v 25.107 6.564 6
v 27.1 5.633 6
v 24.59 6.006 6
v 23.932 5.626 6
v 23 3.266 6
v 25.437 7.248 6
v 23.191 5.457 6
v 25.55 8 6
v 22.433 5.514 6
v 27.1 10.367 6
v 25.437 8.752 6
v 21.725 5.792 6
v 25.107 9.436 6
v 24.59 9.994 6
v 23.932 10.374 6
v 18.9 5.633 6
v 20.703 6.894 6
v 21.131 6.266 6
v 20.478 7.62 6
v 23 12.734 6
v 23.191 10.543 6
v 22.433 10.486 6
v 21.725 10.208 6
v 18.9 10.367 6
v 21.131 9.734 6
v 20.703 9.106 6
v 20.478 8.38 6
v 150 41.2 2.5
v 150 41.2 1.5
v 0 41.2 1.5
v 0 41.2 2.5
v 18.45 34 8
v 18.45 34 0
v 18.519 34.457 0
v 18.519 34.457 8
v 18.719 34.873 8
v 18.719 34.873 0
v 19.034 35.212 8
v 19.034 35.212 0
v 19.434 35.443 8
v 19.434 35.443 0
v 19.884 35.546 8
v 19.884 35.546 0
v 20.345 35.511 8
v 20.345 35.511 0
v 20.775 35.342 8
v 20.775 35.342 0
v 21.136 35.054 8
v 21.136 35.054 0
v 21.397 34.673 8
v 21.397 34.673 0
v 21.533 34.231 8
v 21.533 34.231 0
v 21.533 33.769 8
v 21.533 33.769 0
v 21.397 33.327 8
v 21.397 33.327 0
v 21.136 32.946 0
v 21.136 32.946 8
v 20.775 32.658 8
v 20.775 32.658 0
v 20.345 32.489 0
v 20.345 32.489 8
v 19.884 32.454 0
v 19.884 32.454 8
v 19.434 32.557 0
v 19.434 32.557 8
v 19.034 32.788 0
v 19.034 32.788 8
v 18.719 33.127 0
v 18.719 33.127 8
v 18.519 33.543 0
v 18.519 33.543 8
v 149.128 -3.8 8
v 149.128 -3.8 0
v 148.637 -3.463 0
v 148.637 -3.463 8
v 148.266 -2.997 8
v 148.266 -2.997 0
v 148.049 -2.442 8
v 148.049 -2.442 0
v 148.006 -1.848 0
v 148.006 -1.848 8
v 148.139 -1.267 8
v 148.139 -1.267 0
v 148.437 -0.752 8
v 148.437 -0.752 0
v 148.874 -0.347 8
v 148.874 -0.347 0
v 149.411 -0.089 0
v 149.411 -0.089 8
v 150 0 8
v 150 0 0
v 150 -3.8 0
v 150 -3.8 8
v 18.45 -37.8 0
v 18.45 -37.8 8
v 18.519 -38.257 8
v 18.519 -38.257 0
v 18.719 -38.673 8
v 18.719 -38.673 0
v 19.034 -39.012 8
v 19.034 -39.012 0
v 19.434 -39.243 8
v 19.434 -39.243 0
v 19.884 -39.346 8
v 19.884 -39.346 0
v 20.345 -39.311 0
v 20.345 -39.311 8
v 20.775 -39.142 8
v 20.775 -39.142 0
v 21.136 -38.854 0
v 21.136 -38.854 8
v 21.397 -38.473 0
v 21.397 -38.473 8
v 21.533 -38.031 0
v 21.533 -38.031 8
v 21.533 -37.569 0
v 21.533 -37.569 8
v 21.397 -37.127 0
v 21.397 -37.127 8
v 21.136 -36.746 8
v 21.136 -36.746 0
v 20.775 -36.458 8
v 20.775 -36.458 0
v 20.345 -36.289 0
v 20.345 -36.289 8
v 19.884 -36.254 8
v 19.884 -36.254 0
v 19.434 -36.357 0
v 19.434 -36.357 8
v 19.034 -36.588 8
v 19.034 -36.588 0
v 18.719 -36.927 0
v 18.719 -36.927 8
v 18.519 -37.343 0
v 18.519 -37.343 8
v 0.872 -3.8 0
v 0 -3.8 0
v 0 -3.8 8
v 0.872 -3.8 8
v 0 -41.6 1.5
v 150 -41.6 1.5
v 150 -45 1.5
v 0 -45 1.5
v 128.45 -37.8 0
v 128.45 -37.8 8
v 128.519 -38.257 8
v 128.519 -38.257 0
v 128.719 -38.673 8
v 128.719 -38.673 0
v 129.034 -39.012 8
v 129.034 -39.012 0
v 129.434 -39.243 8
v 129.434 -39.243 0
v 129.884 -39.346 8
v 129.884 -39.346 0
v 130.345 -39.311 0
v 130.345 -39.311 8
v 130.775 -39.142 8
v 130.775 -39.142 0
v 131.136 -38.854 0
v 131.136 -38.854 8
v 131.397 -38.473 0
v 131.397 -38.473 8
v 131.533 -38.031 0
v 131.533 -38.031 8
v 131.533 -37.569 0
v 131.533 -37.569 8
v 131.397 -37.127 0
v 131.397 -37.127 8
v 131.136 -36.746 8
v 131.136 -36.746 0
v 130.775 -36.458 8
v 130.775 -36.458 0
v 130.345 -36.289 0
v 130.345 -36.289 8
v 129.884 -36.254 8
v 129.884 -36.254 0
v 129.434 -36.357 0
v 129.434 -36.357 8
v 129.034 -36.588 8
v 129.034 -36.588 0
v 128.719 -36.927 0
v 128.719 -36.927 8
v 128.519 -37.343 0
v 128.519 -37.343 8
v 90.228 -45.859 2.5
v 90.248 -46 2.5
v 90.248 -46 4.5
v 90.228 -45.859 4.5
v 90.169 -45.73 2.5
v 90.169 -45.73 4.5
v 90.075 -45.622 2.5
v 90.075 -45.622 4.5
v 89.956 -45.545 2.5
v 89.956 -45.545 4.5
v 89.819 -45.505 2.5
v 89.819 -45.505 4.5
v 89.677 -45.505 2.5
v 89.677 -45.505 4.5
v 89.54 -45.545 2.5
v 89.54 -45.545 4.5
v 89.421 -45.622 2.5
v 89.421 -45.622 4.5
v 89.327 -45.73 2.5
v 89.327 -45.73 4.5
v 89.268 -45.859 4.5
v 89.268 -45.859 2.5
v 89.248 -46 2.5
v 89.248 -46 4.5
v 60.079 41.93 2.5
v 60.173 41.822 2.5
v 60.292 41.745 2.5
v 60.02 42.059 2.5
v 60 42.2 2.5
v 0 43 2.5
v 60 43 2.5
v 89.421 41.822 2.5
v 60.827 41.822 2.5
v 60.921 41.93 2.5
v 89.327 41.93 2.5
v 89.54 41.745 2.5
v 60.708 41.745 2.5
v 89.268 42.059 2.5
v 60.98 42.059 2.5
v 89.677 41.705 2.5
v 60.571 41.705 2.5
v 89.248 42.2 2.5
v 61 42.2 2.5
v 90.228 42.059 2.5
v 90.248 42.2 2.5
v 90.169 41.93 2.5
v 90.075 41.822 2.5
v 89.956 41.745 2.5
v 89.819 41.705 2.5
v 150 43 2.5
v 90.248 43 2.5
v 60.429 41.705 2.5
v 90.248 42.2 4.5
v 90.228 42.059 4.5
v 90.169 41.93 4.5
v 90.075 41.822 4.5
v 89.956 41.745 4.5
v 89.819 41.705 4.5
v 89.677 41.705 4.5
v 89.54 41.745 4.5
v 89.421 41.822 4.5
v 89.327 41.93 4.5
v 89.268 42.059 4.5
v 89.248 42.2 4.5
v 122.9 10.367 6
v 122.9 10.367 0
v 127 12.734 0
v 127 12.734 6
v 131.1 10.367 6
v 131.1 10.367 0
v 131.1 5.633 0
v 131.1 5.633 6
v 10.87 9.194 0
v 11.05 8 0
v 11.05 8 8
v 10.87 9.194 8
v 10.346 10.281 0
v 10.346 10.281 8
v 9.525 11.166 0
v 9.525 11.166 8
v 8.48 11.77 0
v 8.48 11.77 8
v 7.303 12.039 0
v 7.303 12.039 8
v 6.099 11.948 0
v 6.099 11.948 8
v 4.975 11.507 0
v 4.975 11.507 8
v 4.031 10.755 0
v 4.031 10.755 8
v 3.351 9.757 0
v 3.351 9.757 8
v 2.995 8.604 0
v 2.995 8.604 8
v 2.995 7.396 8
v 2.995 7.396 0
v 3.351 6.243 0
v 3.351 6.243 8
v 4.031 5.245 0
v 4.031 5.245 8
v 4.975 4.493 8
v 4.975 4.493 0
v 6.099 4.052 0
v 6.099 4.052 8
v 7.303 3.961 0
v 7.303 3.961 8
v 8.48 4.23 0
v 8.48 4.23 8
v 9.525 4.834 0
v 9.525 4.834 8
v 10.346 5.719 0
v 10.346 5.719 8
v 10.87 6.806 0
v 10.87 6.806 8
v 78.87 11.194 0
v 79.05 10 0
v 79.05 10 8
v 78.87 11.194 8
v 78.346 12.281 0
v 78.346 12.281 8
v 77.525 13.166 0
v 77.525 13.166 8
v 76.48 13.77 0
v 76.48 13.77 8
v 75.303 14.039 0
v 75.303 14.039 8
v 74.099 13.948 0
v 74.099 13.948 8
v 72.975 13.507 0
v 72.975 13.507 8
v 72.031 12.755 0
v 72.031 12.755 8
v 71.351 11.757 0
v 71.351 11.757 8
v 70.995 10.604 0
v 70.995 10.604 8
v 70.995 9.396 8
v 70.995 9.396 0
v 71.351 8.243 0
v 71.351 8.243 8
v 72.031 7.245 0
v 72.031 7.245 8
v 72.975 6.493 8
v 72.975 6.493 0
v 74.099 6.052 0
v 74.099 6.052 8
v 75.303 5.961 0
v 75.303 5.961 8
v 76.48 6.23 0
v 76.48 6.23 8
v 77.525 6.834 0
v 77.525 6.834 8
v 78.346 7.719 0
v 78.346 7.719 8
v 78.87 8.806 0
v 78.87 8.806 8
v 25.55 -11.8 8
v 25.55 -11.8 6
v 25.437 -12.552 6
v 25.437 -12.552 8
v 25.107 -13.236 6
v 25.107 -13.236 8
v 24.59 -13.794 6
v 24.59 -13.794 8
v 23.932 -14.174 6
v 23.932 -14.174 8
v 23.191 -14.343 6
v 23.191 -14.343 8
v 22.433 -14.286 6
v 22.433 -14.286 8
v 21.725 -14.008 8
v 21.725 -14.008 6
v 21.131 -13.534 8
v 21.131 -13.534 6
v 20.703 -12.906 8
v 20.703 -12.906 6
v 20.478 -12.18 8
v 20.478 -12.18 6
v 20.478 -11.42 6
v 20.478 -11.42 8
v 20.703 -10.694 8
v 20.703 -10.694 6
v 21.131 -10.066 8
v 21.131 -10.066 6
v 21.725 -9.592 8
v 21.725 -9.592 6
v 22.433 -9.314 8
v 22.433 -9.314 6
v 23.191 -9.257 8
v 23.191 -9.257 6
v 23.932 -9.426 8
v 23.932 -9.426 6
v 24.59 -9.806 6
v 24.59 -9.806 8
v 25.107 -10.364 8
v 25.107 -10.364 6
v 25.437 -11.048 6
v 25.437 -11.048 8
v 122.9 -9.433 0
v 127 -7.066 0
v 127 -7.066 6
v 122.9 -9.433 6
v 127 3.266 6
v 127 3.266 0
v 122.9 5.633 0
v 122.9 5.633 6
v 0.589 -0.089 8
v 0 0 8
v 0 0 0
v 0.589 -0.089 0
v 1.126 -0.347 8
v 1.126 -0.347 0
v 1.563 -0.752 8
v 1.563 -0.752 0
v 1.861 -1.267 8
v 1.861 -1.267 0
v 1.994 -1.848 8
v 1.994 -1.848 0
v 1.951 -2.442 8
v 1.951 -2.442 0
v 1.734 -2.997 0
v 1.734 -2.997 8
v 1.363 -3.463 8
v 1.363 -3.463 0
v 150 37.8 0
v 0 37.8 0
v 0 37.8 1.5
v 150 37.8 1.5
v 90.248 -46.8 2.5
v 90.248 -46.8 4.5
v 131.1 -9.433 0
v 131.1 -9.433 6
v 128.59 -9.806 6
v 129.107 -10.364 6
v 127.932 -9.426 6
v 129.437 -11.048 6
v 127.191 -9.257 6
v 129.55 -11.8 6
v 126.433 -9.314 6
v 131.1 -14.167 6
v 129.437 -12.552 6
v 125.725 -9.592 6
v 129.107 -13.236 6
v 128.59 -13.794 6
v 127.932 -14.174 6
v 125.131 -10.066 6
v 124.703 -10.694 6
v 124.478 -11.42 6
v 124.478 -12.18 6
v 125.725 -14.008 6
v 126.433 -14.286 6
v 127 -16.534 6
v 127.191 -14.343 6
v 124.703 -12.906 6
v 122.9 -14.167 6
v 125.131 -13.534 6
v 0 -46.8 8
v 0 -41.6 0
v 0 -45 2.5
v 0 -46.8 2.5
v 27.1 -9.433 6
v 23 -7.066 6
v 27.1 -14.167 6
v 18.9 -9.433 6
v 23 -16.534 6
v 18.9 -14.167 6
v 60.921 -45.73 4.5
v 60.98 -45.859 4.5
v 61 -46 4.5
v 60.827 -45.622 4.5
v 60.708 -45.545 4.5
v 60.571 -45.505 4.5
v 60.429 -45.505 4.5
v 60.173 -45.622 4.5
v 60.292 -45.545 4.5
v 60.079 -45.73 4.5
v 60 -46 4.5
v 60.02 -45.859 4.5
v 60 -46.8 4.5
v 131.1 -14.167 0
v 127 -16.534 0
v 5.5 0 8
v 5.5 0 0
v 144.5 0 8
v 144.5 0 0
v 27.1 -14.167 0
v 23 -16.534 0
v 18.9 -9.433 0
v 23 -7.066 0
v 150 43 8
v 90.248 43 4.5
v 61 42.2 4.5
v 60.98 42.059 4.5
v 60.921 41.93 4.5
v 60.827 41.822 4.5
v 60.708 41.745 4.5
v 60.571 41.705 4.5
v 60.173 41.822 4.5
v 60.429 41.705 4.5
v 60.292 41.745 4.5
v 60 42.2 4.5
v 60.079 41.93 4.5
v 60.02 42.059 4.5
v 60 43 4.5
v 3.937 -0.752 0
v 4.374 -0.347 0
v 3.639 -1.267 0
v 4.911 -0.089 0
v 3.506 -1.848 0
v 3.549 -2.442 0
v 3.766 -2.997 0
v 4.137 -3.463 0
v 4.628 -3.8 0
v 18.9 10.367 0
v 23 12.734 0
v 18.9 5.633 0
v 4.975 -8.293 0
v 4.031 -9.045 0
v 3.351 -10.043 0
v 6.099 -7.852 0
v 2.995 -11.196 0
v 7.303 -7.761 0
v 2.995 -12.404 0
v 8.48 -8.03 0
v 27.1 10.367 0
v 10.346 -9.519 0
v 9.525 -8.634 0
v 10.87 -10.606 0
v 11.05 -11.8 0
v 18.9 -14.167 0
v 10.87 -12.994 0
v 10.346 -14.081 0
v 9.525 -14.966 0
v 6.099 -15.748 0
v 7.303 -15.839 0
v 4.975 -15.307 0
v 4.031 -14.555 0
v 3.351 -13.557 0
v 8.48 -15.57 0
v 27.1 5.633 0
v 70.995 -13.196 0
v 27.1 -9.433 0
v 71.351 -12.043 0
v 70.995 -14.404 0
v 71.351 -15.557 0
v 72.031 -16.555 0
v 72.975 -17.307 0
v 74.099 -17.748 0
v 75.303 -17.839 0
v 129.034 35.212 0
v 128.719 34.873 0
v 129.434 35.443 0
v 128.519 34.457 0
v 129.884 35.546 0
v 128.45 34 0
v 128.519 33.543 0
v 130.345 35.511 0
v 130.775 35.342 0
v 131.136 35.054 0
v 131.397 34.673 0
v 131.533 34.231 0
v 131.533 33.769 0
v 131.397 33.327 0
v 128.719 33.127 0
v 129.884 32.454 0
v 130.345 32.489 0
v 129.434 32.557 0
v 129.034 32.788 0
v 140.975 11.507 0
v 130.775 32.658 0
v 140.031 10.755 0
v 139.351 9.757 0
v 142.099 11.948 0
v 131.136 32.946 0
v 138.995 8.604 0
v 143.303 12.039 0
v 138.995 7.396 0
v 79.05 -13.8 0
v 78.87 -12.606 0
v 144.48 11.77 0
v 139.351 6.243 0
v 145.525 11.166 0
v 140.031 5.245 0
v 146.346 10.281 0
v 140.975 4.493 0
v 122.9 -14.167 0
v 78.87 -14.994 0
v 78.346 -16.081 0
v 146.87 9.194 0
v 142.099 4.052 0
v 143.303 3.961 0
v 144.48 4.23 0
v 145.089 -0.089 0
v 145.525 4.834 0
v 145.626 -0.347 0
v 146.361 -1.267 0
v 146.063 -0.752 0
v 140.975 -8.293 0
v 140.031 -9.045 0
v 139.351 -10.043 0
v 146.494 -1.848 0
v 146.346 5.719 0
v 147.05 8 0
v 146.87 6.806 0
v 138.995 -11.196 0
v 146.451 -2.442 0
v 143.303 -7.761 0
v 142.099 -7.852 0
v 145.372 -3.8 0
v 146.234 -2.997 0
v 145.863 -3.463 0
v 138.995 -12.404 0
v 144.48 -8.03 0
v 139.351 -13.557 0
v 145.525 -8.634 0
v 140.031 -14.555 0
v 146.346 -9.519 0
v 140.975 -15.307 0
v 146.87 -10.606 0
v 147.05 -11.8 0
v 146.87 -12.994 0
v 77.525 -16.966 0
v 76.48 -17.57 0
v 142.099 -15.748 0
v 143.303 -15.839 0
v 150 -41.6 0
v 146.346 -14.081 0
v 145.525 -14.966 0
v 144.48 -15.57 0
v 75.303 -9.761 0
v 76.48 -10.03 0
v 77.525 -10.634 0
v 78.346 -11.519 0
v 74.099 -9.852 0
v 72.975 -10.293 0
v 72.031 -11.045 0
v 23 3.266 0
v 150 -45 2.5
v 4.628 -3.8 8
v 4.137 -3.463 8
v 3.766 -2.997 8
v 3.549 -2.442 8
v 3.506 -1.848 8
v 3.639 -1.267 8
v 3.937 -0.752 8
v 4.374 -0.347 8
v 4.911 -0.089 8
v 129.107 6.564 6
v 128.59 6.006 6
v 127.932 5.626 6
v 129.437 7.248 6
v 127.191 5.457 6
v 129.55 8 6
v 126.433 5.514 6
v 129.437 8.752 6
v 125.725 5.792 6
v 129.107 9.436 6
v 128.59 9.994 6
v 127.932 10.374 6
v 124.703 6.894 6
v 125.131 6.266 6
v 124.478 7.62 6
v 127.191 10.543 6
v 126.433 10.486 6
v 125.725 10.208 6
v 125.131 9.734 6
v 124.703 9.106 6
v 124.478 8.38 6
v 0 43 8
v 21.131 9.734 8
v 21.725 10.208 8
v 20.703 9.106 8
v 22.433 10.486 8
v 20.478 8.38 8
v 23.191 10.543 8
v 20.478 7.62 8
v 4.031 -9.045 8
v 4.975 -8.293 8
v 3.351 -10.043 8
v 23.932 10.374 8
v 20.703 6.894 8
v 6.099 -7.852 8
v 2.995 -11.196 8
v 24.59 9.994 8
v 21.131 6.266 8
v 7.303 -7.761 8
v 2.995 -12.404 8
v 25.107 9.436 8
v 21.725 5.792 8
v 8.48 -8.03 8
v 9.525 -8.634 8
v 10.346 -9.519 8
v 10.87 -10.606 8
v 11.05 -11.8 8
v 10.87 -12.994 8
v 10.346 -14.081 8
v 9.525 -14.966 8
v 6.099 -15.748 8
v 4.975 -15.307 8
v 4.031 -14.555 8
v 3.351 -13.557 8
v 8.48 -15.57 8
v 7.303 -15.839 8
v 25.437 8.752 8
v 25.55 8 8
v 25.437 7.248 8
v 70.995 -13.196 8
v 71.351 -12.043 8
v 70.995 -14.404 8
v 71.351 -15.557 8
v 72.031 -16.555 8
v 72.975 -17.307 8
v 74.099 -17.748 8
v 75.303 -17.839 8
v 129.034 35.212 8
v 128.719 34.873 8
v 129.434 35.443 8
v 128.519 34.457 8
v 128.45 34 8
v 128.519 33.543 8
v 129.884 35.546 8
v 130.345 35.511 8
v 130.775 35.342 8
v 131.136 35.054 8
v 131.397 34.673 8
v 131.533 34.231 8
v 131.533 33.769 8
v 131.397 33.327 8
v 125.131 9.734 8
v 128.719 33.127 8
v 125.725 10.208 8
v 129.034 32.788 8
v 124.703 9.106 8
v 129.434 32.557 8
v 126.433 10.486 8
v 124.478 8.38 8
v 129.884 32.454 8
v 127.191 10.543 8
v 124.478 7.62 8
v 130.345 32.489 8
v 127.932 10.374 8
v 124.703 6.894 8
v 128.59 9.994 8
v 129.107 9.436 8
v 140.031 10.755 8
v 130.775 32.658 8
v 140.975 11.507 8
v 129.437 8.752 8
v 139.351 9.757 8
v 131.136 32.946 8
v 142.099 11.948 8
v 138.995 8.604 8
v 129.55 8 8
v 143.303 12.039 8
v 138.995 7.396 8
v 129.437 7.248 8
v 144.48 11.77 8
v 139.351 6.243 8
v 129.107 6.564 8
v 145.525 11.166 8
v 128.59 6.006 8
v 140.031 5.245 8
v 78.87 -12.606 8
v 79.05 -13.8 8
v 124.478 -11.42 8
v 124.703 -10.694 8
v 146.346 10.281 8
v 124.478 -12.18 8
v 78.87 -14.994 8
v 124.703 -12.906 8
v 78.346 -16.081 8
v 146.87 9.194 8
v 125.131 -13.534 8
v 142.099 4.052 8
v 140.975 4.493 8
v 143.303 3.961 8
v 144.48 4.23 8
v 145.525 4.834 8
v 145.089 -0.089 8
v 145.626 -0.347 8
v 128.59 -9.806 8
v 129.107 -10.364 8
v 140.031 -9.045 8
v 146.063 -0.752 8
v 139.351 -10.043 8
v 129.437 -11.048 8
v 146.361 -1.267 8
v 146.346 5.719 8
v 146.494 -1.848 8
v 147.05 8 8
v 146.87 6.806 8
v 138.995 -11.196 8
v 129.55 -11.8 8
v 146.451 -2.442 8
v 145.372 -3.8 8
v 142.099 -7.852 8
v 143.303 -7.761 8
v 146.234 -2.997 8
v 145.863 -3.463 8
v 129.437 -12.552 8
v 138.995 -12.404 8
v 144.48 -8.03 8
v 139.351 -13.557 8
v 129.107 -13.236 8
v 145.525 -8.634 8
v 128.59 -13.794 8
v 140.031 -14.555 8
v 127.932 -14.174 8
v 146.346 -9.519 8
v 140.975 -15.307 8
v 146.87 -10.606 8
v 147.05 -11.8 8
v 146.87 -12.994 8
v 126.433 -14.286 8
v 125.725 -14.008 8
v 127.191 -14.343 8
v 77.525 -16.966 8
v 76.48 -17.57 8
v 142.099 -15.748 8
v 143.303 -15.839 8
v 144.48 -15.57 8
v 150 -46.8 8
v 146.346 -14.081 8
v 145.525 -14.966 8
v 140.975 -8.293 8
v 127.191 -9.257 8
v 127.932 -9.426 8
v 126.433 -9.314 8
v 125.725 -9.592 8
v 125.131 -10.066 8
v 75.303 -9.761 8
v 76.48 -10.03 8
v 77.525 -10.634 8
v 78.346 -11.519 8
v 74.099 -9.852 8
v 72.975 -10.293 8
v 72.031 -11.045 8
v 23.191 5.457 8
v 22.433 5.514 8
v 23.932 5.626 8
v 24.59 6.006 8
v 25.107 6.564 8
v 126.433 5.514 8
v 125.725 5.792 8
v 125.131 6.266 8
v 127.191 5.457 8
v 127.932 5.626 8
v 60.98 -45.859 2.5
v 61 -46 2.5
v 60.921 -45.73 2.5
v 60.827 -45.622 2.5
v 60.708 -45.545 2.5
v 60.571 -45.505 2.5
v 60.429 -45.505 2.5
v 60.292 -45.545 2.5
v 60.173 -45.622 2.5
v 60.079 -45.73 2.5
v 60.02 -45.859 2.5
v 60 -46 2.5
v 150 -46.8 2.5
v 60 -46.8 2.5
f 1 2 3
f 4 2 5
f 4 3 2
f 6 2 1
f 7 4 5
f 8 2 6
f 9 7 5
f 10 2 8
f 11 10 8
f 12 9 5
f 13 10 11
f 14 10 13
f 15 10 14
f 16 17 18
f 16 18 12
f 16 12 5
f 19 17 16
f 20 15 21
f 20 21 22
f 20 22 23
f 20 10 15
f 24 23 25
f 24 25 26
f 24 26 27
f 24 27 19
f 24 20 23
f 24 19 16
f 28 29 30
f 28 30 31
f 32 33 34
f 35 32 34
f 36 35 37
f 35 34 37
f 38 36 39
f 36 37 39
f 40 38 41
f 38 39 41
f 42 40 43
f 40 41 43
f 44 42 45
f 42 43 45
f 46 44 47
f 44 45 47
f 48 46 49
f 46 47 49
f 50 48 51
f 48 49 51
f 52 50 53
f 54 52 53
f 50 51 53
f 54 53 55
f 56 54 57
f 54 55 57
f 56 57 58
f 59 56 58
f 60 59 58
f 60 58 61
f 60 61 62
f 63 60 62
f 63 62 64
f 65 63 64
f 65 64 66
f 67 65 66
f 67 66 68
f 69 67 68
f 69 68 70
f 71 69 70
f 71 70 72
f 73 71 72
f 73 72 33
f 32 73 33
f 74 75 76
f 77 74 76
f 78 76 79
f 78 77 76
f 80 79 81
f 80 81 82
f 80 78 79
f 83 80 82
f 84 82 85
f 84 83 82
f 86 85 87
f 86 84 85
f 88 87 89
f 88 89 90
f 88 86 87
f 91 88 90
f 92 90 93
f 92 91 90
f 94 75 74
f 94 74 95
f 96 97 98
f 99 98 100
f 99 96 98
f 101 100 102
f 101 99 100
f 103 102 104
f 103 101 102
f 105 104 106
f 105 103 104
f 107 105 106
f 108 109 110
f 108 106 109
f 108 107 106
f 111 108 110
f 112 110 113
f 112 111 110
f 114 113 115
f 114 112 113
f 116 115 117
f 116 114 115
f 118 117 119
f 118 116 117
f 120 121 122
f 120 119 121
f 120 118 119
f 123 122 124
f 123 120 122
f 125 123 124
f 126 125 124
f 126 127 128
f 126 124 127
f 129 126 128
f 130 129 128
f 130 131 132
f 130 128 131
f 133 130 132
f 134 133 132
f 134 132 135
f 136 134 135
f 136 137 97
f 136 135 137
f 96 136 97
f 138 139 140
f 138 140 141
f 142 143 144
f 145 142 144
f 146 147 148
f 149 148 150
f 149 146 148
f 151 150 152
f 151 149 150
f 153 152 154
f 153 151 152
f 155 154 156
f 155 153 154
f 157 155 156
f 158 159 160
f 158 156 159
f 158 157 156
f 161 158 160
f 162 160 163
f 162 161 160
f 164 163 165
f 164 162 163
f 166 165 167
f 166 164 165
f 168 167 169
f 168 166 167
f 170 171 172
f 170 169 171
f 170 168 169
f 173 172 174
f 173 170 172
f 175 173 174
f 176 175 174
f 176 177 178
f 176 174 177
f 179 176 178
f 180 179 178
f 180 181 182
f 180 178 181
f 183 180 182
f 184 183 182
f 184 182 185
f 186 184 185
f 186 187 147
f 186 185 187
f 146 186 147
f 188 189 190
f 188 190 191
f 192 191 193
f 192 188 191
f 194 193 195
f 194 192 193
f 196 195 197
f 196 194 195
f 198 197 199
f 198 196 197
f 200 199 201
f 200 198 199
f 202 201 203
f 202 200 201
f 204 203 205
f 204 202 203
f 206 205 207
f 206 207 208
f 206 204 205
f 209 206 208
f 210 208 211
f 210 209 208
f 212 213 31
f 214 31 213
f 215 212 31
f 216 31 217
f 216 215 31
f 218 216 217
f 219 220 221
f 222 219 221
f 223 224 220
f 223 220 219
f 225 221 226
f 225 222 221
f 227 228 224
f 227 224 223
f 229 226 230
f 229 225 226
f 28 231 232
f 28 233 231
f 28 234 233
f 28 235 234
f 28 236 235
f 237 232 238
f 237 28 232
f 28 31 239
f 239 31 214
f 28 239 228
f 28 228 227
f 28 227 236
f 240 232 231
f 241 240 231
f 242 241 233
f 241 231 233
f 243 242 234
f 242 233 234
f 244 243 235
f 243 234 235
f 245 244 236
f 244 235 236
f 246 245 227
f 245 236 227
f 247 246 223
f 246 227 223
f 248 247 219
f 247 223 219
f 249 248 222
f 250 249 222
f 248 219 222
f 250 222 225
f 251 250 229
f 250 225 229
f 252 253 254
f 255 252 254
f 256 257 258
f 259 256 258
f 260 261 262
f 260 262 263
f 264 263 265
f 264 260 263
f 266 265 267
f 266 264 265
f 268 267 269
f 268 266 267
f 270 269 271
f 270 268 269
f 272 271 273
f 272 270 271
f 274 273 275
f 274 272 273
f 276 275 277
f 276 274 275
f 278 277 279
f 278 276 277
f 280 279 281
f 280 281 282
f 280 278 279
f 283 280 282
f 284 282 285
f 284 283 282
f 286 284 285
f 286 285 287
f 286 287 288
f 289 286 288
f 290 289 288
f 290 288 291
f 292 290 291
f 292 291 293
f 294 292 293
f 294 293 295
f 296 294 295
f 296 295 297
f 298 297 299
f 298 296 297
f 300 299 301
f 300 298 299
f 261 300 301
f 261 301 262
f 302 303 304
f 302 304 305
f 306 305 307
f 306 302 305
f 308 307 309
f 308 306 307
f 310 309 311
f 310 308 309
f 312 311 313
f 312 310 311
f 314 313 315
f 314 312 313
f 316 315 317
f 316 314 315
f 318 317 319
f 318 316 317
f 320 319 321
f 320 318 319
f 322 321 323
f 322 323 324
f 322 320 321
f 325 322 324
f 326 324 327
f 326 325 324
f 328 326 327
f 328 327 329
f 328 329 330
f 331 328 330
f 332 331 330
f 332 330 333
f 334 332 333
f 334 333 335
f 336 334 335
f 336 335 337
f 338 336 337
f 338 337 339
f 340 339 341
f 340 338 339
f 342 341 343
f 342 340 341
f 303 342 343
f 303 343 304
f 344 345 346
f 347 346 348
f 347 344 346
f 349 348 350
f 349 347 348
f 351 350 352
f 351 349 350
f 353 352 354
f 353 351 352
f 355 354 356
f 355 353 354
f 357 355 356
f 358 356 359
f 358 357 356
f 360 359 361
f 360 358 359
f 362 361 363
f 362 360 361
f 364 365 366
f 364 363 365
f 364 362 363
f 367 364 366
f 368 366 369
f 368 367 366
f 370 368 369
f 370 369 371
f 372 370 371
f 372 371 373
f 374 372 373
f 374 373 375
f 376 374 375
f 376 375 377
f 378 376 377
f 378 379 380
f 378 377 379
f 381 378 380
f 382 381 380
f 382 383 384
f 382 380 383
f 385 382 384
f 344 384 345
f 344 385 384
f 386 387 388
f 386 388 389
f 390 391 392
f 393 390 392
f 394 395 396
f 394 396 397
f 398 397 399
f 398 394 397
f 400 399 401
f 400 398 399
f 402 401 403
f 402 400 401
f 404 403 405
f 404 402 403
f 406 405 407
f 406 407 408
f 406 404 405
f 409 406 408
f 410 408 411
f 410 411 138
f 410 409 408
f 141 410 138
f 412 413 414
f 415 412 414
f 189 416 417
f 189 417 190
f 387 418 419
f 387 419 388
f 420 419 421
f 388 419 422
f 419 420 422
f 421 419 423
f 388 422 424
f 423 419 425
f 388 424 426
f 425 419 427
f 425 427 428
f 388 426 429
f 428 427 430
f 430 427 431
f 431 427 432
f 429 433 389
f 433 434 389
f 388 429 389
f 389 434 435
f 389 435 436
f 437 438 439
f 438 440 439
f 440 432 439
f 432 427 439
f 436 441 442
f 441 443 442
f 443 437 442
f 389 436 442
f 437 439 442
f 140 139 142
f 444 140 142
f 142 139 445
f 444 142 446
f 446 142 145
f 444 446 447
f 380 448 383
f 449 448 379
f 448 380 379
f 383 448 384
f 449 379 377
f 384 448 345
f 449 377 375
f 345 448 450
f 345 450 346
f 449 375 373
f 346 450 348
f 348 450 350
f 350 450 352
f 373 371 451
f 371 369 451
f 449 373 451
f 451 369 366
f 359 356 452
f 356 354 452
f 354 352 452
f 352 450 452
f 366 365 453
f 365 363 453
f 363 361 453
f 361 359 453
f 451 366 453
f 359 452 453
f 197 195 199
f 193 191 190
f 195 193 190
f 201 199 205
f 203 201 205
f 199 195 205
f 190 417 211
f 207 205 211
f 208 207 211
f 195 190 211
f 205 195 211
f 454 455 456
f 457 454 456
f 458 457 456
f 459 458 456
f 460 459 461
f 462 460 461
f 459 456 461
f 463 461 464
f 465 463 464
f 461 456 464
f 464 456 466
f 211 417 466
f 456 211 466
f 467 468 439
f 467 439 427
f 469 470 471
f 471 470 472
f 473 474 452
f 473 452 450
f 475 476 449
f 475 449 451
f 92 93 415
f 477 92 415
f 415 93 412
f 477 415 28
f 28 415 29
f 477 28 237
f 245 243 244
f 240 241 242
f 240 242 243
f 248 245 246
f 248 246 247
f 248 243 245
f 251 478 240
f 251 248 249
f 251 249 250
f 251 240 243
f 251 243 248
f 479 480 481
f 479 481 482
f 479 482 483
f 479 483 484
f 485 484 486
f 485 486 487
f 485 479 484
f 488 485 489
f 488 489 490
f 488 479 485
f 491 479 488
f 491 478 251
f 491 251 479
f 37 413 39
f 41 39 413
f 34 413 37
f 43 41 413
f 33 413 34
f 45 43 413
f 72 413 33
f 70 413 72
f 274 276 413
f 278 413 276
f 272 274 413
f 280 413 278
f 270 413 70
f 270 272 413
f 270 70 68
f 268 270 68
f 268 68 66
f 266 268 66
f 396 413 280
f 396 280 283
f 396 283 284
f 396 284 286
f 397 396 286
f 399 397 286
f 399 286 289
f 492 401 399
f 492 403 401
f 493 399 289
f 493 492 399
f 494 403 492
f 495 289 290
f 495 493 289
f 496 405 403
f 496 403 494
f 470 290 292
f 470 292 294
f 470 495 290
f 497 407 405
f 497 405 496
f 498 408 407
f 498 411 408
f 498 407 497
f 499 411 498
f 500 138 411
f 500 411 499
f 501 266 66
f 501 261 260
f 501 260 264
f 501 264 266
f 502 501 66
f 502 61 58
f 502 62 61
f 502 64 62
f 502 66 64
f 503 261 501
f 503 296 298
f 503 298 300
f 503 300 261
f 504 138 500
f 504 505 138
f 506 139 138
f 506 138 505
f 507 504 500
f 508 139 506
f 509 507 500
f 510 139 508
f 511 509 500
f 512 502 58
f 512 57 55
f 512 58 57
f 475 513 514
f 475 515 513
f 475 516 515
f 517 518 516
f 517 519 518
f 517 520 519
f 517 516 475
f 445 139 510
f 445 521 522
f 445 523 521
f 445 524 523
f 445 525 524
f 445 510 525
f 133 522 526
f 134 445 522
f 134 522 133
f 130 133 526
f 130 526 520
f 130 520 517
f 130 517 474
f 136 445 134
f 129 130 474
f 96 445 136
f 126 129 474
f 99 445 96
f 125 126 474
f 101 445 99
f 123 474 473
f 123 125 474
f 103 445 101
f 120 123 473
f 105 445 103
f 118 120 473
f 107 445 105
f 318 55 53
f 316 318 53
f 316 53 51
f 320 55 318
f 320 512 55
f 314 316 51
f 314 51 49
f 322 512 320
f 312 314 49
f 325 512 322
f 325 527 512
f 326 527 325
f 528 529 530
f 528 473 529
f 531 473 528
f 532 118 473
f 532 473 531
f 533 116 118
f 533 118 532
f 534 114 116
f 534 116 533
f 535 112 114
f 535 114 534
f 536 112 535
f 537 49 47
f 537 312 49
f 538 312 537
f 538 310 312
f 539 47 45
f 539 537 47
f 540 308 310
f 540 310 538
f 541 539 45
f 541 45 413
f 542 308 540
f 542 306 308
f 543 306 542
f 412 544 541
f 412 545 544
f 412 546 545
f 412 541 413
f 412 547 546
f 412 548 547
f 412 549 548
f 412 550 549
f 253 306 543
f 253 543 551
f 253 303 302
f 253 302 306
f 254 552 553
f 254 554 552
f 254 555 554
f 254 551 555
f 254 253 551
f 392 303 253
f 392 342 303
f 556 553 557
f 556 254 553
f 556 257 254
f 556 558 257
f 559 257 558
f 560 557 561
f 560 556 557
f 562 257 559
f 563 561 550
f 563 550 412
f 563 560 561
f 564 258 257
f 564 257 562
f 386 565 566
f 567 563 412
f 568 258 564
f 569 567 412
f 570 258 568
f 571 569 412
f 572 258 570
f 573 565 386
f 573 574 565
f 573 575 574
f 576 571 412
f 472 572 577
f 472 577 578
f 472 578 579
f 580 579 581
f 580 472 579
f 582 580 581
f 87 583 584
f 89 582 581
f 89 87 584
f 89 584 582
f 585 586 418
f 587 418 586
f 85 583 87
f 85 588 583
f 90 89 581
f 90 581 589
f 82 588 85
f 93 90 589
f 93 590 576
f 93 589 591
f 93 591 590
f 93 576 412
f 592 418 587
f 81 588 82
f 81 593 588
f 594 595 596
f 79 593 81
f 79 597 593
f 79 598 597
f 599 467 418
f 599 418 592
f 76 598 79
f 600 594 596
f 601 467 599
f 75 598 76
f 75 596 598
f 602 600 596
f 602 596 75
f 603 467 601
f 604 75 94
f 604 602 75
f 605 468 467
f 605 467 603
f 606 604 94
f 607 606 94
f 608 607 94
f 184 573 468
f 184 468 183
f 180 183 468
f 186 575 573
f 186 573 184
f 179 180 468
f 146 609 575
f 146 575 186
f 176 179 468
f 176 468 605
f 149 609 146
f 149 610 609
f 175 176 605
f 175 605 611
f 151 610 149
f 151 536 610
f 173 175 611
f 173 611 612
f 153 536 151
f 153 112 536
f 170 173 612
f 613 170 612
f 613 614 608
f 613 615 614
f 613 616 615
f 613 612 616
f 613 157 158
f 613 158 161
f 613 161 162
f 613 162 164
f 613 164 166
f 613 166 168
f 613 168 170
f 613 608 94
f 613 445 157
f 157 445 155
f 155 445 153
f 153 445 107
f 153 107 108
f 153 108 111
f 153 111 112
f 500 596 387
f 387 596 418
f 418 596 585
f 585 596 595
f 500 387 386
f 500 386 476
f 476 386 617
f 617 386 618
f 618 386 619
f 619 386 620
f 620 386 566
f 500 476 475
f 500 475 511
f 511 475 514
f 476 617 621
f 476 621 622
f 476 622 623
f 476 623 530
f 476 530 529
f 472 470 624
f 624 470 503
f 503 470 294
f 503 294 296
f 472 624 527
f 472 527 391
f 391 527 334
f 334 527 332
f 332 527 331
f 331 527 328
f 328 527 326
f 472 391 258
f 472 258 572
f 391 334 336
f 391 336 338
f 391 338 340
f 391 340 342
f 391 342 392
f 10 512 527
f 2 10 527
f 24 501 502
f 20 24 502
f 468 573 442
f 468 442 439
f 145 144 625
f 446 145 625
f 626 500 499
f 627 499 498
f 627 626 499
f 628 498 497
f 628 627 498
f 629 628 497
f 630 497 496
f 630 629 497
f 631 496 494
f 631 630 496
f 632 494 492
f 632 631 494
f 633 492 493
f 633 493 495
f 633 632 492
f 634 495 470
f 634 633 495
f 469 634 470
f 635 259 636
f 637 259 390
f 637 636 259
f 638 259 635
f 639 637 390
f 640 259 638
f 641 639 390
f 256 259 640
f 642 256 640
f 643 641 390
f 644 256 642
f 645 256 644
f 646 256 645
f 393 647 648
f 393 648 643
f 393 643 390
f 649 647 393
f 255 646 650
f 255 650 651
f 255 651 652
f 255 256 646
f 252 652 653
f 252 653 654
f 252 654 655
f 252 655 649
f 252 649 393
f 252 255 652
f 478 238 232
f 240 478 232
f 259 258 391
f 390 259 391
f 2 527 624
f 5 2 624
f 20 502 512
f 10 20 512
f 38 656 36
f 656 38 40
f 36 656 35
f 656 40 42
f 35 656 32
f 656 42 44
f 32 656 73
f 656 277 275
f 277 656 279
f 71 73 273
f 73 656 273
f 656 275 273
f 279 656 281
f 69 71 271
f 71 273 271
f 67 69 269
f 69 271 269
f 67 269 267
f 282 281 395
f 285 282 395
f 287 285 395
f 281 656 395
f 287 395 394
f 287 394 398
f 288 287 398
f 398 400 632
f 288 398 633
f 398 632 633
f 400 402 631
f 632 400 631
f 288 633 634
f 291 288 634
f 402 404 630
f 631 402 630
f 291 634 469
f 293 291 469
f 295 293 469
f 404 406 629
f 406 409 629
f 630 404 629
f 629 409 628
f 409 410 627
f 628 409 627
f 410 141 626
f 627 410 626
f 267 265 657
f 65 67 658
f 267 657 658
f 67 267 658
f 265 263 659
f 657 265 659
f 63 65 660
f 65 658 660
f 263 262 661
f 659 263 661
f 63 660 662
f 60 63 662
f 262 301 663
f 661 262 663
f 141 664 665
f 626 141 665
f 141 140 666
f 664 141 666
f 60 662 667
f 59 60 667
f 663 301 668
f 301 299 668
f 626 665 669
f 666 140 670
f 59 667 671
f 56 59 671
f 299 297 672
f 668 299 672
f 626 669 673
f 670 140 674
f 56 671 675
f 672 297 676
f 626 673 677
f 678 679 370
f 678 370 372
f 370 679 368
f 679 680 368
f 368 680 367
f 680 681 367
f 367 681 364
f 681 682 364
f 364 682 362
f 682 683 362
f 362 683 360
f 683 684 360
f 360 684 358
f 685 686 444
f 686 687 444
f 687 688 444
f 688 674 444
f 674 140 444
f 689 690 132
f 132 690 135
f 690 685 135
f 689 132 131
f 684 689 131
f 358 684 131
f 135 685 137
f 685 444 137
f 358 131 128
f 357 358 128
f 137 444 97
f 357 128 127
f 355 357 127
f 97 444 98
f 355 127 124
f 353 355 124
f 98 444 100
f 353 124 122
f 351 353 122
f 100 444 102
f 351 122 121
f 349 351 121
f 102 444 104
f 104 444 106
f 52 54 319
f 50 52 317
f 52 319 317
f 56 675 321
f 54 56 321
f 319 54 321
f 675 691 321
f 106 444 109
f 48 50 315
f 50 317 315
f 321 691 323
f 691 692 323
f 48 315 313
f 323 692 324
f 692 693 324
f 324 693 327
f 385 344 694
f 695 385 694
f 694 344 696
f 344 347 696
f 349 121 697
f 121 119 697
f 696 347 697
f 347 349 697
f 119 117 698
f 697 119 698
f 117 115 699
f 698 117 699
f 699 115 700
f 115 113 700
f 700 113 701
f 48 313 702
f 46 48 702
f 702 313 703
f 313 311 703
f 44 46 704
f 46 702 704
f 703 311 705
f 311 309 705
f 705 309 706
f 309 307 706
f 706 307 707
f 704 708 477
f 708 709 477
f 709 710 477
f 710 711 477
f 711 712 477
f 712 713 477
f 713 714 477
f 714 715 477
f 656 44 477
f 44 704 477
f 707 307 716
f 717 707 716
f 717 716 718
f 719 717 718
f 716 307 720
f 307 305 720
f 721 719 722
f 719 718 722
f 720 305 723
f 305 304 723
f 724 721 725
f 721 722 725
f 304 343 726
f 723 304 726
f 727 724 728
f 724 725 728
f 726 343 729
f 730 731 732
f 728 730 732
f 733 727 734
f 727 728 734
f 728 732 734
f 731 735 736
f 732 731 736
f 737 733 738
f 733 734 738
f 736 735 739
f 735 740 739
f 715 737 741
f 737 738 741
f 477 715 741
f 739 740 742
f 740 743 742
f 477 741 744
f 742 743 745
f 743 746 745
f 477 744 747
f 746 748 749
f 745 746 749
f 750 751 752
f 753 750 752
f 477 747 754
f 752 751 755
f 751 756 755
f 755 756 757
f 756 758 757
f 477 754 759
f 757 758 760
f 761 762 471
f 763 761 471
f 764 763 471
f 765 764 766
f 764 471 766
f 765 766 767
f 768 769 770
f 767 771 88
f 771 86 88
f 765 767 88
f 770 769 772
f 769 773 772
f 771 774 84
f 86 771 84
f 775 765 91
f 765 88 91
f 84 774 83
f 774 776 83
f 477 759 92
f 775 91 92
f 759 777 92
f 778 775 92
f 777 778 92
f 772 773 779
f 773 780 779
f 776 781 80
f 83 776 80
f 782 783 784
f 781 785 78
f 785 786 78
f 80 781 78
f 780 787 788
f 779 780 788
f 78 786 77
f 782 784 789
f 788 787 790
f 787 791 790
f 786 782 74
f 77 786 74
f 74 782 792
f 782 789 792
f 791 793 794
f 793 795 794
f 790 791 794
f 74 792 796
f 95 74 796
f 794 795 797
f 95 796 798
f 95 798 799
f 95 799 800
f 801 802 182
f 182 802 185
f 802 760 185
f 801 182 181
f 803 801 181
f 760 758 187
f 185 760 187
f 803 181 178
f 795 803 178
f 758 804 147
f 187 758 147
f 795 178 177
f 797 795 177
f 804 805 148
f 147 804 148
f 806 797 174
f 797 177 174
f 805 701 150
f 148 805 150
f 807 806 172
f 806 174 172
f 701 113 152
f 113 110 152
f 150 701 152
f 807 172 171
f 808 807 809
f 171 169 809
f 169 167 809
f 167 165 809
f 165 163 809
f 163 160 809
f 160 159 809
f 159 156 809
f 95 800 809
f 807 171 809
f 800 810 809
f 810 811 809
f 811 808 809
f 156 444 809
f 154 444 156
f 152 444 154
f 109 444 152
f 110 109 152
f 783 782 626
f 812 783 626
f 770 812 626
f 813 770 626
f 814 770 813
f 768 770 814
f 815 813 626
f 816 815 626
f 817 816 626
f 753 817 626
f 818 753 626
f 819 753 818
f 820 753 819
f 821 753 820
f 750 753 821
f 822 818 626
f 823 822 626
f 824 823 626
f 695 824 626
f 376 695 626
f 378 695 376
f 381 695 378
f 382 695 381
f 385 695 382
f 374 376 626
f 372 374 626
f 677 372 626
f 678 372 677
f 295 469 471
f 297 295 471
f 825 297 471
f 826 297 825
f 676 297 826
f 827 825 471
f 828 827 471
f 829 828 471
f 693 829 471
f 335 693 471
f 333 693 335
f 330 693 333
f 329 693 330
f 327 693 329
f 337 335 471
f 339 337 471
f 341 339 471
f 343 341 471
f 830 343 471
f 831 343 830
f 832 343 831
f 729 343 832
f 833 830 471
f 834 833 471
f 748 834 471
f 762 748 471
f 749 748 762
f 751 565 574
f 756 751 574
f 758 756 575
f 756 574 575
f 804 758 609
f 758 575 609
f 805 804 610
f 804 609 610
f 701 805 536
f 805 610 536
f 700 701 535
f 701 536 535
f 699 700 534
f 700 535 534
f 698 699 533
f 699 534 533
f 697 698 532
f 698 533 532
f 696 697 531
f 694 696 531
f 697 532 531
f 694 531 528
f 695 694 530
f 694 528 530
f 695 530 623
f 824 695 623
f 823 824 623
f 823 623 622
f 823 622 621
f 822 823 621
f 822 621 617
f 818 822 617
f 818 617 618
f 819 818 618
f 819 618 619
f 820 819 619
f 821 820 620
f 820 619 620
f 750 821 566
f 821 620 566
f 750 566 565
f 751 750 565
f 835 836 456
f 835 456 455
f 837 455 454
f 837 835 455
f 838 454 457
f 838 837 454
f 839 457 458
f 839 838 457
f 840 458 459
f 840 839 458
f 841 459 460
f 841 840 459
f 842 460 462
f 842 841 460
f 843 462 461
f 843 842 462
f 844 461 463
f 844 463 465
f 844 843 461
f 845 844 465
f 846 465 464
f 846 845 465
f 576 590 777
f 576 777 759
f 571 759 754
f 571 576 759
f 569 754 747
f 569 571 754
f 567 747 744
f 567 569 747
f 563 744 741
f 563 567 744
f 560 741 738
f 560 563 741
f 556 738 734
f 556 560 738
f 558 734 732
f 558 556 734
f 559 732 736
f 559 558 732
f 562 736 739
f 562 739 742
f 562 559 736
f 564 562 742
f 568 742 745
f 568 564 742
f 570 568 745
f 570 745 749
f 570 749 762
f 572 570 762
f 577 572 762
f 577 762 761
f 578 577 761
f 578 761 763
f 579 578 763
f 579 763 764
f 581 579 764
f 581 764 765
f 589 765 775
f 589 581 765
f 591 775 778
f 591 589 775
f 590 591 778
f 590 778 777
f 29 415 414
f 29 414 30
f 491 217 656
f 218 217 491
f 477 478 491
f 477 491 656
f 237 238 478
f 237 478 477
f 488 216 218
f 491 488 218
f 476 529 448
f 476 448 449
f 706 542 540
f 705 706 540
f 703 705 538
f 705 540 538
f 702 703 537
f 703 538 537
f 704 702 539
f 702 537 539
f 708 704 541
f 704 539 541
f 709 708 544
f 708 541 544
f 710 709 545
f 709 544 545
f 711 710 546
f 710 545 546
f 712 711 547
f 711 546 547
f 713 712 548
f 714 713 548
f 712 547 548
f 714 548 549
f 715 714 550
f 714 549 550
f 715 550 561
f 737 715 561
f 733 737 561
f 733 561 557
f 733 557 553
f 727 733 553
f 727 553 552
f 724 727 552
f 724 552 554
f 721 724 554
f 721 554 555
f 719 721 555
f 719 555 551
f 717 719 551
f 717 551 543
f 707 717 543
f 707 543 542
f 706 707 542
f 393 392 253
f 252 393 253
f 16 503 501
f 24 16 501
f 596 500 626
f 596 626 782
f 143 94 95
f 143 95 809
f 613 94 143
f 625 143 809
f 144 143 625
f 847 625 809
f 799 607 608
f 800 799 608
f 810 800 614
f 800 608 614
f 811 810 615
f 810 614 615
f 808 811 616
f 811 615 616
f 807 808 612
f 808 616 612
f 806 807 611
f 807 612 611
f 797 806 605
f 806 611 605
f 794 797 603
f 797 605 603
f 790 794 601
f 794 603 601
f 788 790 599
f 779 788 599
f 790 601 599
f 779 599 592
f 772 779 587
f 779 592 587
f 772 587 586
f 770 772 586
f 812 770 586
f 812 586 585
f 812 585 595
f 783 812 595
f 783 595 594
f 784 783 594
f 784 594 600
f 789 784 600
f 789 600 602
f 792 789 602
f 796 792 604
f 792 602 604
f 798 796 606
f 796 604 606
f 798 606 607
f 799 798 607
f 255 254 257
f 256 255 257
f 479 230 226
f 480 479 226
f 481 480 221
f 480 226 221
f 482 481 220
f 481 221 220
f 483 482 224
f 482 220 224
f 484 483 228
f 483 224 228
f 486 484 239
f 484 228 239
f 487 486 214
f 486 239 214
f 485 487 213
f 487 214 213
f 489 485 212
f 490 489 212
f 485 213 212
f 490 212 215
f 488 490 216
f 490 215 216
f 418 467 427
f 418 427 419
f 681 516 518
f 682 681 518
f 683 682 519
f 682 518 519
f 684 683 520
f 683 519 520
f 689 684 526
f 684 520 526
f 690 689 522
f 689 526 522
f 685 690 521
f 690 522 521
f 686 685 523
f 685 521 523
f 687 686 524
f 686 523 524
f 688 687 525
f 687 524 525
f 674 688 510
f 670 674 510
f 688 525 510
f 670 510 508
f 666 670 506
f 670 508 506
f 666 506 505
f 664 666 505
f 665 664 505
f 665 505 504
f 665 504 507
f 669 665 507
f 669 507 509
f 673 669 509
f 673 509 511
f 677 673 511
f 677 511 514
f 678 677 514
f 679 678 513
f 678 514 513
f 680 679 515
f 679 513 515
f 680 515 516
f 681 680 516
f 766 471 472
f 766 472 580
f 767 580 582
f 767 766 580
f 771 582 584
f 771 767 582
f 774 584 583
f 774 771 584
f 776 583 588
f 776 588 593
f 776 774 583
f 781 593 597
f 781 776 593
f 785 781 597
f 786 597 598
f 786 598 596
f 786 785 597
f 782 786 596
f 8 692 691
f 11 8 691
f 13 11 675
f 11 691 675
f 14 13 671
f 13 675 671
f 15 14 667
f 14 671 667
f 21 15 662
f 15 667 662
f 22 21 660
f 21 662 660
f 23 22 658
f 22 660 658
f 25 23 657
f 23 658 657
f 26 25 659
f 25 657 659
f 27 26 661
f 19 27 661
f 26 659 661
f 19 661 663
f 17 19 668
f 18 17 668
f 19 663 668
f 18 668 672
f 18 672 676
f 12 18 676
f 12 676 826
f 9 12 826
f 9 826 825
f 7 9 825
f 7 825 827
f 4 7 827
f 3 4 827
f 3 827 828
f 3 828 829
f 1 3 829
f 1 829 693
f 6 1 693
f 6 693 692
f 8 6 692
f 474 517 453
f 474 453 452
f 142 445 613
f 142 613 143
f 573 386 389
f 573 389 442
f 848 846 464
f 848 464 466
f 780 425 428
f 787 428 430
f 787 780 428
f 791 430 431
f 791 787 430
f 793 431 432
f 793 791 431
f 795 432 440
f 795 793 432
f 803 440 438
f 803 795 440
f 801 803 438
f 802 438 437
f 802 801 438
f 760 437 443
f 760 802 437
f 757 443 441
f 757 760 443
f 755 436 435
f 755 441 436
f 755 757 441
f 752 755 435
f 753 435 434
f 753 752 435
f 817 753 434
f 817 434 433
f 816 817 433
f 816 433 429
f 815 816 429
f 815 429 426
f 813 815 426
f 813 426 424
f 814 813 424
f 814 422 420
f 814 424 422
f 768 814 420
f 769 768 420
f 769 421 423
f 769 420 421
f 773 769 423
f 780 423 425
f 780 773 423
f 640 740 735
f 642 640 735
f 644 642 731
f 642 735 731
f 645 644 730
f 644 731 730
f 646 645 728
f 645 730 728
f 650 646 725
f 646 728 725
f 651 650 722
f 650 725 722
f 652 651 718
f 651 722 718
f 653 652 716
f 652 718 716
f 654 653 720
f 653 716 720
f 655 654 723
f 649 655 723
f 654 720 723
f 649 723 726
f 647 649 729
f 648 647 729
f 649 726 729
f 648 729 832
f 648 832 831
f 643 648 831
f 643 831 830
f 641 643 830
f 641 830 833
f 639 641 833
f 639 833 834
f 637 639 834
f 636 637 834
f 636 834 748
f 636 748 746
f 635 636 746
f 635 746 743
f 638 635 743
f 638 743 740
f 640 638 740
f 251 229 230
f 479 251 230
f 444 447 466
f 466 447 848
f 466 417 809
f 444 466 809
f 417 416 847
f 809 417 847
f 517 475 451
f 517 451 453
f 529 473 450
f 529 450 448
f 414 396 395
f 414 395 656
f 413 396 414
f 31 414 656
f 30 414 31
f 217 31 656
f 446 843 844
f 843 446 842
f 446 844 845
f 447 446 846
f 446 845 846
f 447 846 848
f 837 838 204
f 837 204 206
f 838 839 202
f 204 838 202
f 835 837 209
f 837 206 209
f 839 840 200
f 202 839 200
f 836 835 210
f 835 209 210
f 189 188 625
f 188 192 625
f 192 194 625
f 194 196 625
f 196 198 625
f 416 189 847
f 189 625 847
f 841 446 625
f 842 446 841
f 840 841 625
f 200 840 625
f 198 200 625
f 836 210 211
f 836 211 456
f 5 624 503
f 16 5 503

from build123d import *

# Parameters (mm, degrees)
SKETCH_2_W           = 150
SKETCH_2_H           = 43
SKETCH_2_R           = 4.05
EXTRUDE_1_DEPTH      = 8
SKETCH_3_R           = 2.55
CUT_EXTRUDE_1_DEPTH  = 157.246599963
CUT_EXTRUDE_16_DEPTH = 6
CUT_EXTRUDE_2_DEPTH  = 157.246599963
SKETCH_25_R          = 1.55
CUT_EXTRUDE_13_DEPTH = 157.246599963
CUT_EXTRUDE_11_DEPTH = 2
EXTRUDE_2_DEPTH      = 8


with BuildPart() as part:
    # 草图2 → 凸台-拉伸1 (new body)
    with BuildSketch(Plane.XY):
        with Locations((75, 21.5)):
            Rectangle(SKETCH_2_W, SKETCH_2_H)
        with Locations((7, 8)):
            Circle(SKETCH_2_R, mode=Mode.SUBTRACT)
        with Locations((75, 10)):
            Circle(SKETCH_2_R, mode=Mode.SUBTRACT)
        with Locations((143, 8)):
            Circle(SKETCH_2_R, mode=Mode.SUBTRACT)
    extrude_1 = extrude(amount=EXTRUDE_1_DEPTH)

    # 草图3 → 切除-拉伸1 (cut, through all)
    with BuildSketch(Plane.XY.offset(8)):
        with Locations((23, 8)):
            Circle(SKETCH_3_R)
        with Locations((127, 8)):
            Circle(SKETCH_3_R)
    cut_extrude_1 = extrude(amount=-CUT_EXTRUDE_1_DEPTH, mode=Mode.SUBTRACT)

    # 草图28 → 切除-拉伸16 (cut)
    with BuildSketch(Plane(origin=(0, 0, 0), x_dir=(-1, 0, 0), z_dir=(0, 0, -1))):
        Polygon((-122.9, 5.632863896), (-122.9, 10.367136104), (-127, 12.734272207), (-131.1, 10.367136104), (-131.1, 5.632863896), (-127, 3.265727793), align=None)
        Polygon((-18.9, 5.632863896), (-18.9, 10.367136104), (-23, 12.734272207), (-27.1, 10.367136104), (-27.1, 5.632863896), (-23, 3.265727793), align=None)
    cut_extrude_16 = extrude(amount=-CUT_EXTRUDE_16_DEPTH, mode=Mode.SUBTRACT)

    # 草图4 → 切除-拉伸2 (cut, through all)
    with BuildSketch(Plane(origin=(150, 0, 0), x_dir=(0, 0, -1), z_dir=(1, 0, 0))):
        Polygon((-1.5, 41.2), (-2.5, 41.2), (-2.5, 43), (0, 43), (0, 37.8), (-1.5, 37.8), align=None)
    cut_extrude_2 = extrude(amount=-CUT_EXTRUDE_2_DEPTH, mode=Mode.SUBTRACT)

    # 草图25 → 切除-拉伸13 (cut, through all)
    with BuildSketch(Plane(origin=(0, 0, 0), x_dir=(-1, 0, 0), z_dir=(0, 0, -1))):
        with Locations((-130, 34)):
            Circle(SKETCH_25_R)
        with Locations((-20, 34)):
            Circle(SKETCH_25_R)
    cut_extrude_13 = extrude(amount=-CUT_EXTRUDE_13_DEPTH, mode=Mode.SUBTRACT)

    # 草图19 → 切除-拉伸11 (cut)
    with BuildSketch(Plane(origin=(0, 0, 2.5), x_dir=(-1, 0, 0), z_dir=(0, 0, -1))):
        with BuildLine():
            Line((-60, 43), (-90.247938178, 43))
            Line((-90.247938178, 43), (-90.247938178, 42.2))
            ThreePointArc((-90.247938178, 42.2), (-89.747938178, 41.7), (-89.247938178, 42.2))
            Line((-89.247938178, 42.2), (-61, 42.2))
            ThreePointArc((-61, 42.2), (-60.5, 41.7), (-60, 42.2))
            Line((-60, 42.2), (-60, 43))
        make_face()
    cut_extrude_11 = extrude(amount=-CUT_EXTRUDE_11_DEPTH, mode=Mode.SUBTRACT)

    # 草图22 → 凸台-拉伸2 (add)
    with BuildSketch(Plane.XY.offset(8)):
        with BuildLine():
            Line((0, -4), (5.5, -4))
            ThreePointArc((5.5, -4), (3.5, -2), (5.5, 0))
            Line((5.5, 0), (0, 0))
            ThreePointArc((0, 0), (2, -2), (0, -4))
        make_face()
        with BuildLine():
            Line((150, 0), (144.5, 0))
            ThreePointArc((144.5, 0), (146.5, -2), (144.5, -4))
            Line((144.5, -4), (150, -4))
            ThreePointArc((150, -4), (148, -2), (150, 0))
        make_face()
    extrude(amount=-EXTRUDE_2_DEPTH)

    # 镜向2: 凸台-拉伸1, 切除-拉伸1, 切除-拉伸16, 切除-拉伸2, 切除-拉伸13, 切除-拉伸11 across plane
    add(extrude_1.mirror(Plane(origin=(0, -1.9, 0), x_dir=(0, 0, 1), z_dir=(0, -1, 0))))
    add(cut_extrude_1.mirror(Plane(origin=(0, -1.9, 0), x_dir=(0, 0, 1), z_dir=(0, -1, 0))), mode=Mode.SUBTRACT)
    add(cut_extrude_16.mirror(Plane(origin=(0, -1.9, 0), x_dir=(0, 0, 1), z_dir=(0, -1, 0))), mode=Mode.SUBTRACT)
    add(cut_extrude_2.mirror(Plane(origin=(0, -1.9, 0), x_dir=(0, 0, 1), z_dir=(0, -1, 0))), mode=Mode.SUBTRACT)
    add(cut_extrude_13.mirror(Plane(origin=(0, -1.9, 0), x_dir=(0, 0, 1), z_dir=(0, -1, 0))), mode=Mode.SUBTRACT)
    add(cut_extrude_11.mirror(Plane(origin=(0, -1.9, 0), x_dir=(0, 0, 1), z_dir=(0, -1, 0))), mode=Mode.SUBTRACT)


solid = part.part
